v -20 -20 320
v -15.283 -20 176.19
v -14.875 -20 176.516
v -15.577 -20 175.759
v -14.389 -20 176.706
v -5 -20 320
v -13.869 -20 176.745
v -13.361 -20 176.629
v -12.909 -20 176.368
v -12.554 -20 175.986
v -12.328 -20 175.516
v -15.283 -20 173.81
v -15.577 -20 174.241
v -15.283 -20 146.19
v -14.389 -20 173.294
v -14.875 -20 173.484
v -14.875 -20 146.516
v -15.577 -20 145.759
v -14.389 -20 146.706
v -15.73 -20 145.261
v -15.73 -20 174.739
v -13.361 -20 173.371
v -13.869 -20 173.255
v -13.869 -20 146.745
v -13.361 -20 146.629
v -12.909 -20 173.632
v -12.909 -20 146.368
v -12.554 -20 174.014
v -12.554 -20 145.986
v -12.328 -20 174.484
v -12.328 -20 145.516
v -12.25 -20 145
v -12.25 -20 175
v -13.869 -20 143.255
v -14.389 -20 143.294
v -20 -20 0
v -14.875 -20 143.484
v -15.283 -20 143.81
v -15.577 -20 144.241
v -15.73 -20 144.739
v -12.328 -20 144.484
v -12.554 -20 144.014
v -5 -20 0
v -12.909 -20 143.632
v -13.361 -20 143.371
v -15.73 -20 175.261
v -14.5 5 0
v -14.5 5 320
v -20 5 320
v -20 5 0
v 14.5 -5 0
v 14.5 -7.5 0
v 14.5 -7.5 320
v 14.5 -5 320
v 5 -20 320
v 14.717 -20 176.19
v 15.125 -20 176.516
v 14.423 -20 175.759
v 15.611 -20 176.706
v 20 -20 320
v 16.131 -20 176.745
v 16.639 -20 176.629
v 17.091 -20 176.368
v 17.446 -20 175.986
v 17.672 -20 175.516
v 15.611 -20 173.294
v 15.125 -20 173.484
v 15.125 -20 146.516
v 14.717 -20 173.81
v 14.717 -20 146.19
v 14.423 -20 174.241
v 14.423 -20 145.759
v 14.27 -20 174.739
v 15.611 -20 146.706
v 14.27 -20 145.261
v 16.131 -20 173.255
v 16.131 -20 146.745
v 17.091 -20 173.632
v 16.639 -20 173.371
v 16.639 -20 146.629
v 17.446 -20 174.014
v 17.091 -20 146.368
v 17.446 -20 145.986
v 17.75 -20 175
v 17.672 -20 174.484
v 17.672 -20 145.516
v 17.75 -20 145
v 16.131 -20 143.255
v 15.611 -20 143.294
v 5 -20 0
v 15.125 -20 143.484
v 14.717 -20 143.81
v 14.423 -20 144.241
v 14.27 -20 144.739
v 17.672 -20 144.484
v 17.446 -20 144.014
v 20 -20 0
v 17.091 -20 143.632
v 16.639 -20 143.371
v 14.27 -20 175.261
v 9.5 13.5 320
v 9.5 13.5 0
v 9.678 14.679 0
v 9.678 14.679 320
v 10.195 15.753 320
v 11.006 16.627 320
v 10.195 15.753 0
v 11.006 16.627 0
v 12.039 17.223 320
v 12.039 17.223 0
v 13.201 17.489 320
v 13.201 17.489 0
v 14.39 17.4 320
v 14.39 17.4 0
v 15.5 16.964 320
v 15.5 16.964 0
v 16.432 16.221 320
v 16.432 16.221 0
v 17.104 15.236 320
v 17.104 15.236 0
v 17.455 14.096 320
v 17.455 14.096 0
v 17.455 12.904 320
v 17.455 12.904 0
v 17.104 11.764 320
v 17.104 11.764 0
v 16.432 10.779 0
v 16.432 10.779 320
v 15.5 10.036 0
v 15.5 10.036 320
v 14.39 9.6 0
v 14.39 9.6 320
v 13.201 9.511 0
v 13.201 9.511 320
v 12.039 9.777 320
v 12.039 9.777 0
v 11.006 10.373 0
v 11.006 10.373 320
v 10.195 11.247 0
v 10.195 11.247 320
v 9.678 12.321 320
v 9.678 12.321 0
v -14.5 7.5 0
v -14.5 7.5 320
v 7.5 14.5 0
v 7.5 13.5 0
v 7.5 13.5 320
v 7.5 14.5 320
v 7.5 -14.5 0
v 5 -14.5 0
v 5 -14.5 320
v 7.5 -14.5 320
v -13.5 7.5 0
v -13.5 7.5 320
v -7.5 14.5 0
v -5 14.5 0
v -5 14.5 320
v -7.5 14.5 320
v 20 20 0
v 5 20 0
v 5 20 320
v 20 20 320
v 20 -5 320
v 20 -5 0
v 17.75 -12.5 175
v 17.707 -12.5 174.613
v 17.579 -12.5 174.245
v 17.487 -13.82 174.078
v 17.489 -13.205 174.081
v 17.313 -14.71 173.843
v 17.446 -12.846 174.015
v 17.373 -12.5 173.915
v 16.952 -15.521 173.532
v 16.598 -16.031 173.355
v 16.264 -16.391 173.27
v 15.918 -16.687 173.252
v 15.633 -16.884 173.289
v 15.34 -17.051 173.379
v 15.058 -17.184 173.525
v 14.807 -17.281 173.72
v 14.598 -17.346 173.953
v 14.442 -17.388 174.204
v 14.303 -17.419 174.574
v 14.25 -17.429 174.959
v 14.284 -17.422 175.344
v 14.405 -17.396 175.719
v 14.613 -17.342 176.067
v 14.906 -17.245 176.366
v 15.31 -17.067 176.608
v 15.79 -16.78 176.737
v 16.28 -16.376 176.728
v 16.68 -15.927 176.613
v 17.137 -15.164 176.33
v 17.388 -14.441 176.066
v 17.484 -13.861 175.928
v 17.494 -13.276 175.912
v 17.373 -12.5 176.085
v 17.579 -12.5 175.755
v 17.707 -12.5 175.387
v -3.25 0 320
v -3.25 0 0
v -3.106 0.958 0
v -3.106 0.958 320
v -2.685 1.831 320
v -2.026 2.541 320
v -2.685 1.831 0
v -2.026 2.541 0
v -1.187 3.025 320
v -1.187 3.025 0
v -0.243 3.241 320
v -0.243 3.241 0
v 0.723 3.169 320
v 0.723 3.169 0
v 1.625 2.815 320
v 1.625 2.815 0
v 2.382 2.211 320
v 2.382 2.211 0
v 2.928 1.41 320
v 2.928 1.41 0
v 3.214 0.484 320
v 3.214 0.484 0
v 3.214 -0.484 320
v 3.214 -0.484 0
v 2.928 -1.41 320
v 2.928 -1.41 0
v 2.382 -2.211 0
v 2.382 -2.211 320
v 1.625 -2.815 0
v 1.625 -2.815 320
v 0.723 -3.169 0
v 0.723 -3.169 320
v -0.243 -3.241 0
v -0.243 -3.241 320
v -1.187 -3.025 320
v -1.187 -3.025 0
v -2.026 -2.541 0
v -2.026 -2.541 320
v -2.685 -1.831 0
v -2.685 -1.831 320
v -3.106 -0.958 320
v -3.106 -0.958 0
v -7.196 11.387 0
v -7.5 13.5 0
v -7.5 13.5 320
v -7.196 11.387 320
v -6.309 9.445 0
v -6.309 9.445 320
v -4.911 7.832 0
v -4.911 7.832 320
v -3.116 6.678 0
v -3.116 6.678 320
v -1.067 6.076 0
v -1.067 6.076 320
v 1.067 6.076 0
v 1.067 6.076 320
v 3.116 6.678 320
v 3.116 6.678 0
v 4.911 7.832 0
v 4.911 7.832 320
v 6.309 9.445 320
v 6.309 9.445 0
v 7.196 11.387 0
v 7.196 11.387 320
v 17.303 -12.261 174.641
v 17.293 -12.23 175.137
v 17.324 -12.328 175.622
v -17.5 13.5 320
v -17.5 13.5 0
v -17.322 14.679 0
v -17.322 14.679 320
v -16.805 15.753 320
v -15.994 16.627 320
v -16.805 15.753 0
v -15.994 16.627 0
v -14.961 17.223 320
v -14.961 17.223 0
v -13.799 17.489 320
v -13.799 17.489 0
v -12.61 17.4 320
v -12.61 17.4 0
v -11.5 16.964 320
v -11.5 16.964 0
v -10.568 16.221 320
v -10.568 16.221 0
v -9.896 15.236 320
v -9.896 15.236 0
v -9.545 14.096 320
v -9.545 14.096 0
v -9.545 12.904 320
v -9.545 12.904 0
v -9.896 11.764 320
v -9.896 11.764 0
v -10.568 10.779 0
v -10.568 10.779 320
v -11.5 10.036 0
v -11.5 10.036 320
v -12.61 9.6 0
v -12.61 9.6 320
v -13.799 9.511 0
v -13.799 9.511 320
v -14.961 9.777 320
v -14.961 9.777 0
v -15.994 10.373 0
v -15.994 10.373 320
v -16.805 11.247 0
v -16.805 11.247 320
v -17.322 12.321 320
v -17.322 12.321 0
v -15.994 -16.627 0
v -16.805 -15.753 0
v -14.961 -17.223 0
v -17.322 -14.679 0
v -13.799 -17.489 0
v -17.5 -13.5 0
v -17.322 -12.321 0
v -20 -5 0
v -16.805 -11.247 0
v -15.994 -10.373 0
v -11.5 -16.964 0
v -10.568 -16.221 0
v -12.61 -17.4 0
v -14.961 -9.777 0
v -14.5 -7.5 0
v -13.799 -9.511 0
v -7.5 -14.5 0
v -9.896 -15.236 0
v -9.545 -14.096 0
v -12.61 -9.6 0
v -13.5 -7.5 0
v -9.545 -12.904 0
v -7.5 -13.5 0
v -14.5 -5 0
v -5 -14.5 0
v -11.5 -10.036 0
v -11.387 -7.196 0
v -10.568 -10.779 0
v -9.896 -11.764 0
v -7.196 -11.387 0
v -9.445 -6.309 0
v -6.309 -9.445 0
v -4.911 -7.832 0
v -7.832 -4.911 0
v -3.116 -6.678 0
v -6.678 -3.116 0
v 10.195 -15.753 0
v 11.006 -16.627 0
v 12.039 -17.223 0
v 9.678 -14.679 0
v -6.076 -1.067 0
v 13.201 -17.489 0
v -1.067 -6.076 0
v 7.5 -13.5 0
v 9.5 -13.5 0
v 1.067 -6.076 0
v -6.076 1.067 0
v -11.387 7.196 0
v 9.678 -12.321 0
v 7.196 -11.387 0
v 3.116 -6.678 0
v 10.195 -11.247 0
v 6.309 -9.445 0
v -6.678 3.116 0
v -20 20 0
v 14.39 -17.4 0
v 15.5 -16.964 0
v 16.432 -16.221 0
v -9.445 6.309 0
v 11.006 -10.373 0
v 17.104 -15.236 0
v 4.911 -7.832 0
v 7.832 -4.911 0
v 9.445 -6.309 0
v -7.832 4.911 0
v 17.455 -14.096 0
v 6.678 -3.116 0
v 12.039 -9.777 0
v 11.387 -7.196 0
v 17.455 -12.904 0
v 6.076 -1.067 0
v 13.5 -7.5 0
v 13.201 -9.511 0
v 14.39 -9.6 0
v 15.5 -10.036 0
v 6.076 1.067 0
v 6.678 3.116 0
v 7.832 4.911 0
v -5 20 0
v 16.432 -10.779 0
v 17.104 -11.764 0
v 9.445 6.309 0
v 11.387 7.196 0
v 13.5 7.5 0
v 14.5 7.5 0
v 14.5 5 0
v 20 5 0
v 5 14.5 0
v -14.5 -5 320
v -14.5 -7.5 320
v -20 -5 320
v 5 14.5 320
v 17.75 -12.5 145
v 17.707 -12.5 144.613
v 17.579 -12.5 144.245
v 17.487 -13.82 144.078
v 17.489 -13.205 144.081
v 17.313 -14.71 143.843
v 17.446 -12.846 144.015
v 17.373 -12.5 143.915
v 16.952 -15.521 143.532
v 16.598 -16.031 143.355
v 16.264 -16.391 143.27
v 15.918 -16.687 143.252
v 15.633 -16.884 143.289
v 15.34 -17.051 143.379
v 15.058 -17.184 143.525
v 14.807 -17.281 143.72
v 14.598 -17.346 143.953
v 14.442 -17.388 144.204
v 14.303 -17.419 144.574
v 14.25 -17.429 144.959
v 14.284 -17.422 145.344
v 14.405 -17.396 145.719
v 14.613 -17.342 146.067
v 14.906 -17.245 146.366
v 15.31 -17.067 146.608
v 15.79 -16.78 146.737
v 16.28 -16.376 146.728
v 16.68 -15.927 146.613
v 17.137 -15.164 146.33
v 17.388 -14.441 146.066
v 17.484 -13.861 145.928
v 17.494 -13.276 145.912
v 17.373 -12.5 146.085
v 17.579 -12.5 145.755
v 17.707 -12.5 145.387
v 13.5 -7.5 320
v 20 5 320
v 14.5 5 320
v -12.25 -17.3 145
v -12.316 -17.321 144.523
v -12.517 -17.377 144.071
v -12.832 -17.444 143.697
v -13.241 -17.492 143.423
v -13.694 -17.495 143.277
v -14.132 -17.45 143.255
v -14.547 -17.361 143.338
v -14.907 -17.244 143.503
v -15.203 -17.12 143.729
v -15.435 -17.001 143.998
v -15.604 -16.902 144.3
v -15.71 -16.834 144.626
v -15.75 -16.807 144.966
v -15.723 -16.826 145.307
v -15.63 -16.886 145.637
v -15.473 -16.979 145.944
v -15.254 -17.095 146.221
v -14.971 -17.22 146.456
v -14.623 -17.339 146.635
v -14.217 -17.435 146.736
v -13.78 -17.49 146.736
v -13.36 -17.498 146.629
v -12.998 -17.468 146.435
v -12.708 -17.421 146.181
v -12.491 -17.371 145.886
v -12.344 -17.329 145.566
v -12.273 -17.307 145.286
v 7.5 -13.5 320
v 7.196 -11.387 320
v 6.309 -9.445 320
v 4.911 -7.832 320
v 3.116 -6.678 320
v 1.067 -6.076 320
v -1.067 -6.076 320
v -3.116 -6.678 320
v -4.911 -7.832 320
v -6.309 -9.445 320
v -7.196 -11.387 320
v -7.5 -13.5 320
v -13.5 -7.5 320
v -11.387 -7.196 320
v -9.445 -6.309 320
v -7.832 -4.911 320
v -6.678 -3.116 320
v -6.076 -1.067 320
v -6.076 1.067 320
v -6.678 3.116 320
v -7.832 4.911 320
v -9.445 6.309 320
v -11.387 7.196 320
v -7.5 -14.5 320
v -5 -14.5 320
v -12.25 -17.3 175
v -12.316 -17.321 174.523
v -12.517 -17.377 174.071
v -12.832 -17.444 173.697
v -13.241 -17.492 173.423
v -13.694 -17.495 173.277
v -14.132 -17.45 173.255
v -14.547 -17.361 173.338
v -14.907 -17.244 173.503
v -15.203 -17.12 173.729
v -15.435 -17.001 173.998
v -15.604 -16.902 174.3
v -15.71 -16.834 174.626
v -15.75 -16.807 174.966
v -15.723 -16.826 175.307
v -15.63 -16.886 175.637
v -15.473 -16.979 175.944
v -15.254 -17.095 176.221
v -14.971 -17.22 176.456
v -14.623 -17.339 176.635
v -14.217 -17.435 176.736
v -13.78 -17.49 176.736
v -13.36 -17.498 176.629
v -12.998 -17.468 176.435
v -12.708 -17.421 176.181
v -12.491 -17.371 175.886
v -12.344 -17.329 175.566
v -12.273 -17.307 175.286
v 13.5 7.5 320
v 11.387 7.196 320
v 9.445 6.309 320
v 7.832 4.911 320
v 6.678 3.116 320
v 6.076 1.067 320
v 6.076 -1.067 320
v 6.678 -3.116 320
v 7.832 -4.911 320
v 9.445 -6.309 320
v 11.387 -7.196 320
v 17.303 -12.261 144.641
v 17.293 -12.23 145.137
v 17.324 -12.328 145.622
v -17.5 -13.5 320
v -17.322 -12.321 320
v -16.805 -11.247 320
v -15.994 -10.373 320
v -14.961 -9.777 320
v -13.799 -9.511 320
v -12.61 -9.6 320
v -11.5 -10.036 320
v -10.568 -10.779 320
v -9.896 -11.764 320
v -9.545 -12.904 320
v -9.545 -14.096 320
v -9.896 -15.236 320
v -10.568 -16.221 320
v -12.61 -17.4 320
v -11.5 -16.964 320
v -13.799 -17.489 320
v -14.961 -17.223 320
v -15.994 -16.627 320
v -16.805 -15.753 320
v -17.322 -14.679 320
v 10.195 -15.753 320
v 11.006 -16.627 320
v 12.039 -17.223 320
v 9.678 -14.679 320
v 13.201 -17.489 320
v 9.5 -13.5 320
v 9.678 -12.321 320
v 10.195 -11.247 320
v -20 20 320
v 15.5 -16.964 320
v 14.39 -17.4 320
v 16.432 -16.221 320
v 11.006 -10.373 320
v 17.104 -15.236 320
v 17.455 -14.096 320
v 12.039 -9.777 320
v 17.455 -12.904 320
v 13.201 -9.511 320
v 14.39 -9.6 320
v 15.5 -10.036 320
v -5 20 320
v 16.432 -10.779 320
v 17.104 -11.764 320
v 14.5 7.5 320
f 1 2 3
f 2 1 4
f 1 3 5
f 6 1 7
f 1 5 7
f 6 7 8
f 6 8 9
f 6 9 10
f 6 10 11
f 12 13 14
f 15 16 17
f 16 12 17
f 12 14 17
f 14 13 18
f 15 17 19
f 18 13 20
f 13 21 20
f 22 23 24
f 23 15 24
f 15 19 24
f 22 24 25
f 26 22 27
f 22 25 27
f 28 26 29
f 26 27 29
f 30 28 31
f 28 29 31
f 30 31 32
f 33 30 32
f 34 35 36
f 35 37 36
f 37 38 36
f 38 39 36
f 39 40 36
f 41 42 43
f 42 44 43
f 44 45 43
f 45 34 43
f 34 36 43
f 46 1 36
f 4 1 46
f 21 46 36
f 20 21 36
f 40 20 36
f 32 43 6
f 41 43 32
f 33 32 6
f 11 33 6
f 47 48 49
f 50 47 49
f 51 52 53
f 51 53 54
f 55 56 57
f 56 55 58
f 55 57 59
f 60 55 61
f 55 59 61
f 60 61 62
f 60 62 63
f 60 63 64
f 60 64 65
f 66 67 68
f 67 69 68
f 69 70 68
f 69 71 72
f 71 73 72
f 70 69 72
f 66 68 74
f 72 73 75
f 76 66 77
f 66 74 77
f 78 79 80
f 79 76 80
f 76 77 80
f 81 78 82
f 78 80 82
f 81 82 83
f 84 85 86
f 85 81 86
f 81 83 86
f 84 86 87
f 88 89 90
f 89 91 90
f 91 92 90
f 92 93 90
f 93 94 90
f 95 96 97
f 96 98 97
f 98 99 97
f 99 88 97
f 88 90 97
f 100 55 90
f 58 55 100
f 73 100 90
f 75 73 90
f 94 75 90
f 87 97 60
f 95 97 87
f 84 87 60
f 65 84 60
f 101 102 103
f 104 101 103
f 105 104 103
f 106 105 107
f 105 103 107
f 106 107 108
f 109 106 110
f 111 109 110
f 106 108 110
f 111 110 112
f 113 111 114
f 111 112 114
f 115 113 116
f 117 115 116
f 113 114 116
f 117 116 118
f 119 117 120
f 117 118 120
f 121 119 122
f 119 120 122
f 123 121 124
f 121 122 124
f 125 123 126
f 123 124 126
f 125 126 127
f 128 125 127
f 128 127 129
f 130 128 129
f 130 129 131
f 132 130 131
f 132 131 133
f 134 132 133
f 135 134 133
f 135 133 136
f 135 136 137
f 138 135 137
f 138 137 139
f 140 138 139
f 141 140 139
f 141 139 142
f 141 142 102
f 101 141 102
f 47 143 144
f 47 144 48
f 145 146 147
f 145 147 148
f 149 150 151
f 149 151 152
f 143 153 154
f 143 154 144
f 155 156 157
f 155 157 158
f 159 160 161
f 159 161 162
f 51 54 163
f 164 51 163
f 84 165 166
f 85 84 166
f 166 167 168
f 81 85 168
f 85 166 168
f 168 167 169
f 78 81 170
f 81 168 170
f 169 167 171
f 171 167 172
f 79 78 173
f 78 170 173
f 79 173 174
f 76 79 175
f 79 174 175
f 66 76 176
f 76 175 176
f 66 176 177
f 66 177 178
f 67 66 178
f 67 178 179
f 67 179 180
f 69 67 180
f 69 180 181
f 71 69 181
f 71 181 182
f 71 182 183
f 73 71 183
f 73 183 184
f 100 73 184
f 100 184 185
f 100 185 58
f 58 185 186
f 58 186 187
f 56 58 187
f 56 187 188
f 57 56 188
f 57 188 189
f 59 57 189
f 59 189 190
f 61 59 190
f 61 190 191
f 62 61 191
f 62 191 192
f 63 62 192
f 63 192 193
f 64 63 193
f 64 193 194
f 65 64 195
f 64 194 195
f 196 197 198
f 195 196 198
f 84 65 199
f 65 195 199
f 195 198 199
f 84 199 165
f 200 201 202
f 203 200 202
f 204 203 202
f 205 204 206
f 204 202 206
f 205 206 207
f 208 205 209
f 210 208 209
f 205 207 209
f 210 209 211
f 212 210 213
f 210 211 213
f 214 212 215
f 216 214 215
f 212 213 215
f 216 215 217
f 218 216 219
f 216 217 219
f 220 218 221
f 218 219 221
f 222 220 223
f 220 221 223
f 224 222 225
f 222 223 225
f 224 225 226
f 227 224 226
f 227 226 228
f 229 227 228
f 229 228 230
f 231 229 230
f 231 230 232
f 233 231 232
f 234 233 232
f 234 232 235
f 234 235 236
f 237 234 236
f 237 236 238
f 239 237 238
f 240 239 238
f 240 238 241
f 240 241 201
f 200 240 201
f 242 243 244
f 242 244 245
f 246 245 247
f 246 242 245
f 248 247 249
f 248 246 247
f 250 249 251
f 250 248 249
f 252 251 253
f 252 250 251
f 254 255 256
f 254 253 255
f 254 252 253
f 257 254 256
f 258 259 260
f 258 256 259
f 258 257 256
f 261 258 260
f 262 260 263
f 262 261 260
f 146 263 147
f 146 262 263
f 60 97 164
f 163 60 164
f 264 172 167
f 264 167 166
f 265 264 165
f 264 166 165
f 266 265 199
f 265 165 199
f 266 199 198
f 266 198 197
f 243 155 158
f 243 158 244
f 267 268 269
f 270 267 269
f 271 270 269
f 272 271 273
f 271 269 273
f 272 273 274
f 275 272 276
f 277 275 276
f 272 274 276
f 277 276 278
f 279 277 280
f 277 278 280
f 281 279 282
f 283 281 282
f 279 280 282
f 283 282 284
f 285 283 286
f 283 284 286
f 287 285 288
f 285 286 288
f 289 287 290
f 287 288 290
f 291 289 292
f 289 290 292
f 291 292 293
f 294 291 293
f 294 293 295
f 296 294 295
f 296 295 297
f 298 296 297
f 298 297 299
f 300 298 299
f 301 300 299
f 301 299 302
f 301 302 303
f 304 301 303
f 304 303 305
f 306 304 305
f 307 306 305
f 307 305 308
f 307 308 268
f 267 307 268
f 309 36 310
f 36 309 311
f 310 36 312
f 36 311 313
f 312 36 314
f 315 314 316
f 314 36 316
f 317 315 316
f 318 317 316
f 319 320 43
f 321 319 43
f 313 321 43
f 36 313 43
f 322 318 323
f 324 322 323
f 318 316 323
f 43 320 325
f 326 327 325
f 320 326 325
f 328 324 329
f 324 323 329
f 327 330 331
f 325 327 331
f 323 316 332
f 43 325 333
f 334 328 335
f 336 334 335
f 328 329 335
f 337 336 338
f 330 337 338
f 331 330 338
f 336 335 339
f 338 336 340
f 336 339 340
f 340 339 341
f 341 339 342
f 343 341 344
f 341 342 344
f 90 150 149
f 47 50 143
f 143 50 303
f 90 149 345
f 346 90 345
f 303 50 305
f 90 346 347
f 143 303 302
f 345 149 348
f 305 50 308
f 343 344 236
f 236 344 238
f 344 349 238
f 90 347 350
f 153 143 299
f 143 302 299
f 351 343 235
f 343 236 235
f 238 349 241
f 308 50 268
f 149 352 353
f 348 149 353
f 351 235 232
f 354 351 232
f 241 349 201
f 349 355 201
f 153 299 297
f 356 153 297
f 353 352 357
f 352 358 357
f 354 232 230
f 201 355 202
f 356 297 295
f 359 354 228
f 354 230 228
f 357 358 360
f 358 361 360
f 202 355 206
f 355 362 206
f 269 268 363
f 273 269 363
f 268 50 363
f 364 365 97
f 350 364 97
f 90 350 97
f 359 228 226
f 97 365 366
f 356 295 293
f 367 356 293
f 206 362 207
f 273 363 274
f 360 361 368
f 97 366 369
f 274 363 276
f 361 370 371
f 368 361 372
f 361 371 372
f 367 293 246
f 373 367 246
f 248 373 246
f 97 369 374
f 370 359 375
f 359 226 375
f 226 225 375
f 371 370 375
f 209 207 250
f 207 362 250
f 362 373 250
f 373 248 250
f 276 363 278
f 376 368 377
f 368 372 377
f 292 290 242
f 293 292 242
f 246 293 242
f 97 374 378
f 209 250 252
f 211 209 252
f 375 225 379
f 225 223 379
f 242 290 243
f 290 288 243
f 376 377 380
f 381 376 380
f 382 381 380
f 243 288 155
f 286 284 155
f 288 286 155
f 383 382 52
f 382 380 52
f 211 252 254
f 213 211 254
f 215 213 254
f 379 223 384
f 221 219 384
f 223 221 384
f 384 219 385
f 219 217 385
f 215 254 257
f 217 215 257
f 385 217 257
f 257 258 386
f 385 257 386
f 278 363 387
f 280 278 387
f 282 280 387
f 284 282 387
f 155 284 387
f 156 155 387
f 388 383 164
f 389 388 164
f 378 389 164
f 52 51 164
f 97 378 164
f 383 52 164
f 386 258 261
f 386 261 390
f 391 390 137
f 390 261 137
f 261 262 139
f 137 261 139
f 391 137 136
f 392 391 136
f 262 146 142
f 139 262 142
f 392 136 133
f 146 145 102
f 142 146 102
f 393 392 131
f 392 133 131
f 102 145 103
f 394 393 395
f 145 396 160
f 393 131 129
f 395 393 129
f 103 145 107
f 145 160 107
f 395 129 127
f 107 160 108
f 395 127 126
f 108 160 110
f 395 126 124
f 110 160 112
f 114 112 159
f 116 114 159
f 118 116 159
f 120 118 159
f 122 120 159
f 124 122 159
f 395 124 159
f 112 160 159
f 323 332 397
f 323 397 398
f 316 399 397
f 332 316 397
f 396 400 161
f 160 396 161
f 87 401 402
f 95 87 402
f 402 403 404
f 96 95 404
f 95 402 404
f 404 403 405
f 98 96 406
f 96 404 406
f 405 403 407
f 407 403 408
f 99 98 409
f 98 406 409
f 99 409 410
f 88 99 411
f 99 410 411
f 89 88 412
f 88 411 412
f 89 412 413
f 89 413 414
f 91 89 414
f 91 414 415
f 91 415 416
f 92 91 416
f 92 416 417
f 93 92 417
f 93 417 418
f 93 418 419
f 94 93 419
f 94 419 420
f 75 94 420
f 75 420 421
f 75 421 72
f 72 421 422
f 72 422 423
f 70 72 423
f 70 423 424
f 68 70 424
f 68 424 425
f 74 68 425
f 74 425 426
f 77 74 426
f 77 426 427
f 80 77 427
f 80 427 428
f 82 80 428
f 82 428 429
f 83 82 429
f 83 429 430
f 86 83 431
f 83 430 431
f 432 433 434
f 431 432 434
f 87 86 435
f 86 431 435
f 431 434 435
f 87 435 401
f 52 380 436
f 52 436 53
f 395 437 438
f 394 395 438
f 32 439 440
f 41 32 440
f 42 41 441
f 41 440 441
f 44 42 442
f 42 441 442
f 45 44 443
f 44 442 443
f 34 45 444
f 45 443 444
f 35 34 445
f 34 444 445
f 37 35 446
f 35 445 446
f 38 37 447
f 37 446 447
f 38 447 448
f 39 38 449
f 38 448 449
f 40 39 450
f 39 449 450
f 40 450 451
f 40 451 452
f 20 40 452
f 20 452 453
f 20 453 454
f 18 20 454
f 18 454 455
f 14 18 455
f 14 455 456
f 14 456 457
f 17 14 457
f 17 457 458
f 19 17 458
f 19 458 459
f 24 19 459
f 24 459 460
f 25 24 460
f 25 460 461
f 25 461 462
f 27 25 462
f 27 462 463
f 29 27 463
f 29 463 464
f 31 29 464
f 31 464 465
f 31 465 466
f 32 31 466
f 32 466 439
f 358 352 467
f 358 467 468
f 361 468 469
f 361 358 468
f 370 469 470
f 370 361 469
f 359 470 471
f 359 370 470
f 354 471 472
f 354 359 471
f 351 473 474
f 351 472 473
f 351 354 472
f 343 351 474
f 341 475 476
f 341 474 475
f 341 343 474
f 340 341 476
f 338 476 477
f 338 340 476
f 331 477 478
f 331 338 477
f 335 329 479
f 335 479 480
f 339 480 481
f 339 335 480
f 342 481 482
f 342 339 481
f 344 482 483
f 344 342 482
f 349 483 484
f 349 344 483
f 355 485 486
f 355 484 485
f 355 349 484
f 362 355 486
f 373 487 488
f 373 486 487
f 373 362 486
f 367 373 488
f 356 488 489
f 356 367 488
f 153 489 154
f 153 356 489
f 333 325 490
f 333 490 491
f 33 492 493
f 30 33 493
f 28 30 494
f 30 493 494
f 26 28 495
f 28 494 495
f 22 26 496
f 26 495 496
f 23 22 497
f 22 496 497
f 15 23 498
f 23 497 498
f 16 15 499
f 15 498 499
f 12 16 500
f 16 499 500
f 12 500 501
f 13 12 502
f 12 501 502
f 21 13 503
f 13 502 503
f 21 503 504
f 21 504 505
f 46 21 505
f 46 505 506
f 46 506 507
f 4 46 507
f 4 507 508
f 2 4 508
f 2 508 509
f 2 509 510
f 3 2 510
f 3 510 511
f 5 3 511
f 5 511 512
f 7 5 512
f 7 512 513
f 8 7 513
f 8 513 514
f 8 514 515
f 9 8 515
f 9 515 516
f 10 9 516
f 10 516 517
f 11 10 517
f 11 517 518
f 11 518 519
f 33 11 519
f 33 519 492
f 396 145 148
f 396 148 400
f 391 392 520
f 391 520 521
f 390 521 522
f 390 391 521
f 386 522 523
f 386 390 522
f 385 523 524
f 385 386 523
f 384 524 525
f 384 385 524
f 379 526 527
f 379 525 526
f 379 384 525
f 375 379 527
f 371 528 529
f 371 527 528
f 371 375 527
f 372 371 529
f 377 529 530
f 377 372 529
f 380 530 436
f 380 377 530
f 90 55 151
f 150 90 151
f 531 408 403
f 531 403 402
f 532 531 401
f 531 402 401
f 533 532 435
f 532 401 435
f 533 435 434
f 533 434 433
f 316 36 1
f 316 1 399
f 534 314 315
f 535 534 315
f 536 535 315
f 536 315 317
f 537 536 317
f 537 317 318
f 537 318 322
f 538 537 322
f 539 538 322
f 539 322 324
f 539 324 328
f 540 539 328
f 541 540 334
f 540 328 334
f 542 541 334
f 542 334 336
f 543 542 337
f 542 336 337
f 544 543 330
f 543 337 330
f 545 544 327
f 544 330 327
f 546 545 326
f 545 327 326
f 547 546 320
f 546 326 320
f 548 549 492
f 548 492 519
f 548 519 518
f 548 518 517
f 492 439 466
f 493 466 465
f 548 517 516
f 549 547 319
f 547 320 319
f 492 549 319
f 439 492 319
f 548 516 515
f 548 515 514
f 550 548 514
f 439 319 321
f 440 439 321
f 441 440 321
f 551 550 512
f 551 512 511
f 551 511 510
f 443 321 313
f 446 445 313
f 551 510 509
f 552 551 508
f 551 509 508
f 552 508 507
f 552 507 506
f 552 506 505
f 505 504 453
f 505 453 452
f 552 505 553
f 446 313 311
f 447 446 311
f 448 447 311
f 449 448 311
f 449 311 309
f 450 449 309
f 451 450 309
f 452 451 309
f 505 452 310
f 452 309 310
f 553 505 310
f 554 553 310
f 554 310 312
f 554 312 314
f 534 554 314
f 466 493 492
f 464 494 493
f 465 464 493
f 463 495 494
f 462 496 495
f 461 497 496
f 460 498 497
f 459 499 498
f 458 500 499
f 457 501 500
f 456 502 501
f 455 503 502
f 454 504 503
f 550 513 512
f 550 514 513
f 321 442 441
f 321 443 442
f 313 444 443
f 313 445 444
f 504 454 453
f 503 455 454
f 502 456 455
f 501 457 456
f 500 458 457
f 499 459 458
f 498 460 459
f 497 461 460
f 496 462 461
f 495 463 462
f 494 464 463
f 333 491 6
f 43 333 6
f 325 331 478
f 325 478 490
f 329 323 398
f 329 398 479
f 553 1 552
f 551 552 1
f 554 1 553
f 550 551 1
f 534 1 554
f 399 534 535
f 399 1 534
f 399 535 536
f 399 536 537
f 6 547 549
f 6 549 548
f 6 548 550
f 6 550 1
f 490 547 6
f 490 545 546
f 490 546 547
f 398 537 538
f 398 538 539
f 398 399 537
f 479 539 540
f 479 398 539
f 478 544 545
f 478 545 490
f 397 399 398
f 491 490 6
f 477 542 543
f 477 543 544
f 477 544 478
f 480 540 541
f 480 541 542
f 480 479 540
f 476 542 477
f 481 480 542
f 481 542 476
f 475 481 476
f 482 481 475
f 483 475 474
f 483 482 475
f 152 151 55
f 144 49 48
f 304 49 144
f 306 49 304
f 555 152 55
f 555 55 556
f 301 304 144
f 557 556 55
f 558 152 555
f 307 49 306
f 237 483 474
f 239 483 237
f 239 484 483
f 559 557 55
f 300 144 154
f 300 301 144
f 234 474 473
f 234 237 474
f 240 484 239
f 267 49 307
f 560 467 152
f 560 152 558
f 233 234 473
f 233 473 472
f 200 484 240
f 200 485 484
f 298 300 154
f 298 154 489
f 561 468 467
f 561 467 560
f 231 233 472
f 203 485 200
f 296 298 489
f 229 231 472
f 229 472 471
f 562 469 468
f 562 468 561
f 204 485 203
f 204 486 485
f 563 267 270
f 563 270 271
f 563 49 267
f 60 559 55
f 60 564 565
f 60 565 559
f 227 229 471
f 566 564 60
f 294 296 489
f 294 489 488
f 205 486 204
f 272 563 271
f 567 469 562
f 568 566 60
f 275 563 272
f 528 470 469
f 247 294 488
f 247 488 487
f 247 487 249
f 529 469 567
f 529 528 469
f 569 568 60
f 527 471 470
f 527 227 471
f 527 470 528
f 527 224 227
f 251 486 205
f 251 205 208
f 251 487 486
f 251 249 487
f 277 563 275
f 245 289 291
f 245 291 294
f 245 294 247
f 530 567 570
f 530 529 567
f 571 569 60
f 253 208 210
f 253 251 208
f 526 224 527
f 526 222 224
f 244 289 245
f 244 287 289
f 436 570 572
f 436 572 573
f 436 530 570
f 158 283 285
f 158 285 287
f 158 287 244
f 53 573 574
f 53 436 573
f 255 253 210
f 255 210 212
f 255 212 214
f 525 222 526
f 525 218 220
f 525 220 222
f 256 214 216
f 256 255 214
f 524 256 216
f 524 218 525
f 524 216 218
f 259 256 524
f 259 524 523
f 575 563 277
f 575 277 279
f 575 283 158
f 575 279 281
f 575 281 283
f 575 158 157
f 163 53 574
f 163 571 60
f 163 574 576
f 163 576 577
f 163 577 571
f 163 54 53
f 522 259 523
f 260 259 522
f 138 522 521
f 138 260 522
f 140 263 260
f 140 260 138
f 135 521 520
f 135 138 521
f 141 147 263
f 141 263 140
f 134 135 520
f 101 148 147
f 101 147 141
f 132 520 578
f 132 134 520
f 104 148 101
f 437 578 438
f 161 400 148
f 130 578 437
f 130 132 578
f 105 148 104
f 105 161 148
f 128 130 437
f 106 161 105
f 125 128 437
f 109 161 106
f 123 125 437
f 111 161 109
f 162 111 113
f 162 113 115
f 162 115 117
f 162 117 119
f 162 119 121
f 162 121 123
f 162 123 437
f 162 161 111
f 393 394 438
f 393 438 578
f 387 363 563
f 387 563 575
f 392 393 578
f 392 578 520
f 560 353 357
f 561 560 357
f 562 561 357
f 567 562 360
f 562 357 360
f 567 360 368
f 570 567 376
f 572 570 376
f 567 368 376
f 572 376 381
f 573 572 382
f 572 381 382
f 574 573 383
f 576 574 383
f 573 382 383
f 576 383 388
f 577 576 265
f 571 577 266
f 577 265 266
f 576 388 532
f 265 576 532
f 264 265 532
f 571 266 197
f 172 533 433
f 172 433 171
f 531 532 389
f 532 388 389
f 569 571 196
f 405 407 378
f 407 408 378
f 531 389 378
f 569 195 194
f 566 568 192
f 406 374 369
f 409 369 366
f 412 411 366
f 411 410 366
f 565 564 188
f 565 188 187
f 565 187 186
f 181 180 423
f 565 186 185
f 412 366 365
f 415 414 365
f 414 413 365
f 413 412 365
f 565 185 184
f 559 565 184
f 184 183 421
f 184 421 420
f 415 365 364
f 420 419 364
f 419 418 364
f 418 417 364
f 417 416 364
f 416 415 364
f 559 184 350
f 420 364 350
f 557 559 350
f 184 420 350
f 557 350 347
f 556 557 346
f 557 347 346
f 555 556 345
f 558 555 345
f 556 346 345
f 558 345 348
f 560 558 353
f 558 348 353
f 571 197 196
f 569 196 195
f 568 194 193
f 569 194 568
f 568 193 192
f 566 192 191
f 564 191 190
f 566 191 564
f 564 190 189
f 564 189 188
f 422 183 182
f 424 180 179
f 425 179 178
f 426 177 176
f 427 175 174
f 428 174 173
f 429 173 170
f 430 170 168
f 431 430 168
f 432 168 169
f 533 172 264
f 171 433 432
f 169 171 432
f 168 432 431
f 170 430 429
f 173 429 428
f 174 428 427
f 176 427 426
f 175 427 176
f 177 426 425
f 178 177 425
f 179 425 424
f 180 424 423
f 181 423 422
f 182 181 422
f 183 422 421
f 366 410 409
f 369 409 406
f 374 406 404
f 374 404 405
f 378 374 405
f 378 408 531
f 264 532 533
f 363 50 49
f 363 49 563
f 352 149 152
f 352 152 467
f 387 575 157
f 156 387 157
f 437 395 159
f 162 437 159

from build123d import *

# Parameters (mm, degrees)
SKETCH_1_W                  = 40
SKETCH_1_H                  = 40
EXTRUDE_1_DEPTH             = 320
SKETCH_2_R                  = 3.25
SKETCH_2_R_2                = 4
CUT_EXTRUDE_1_DEPTH         = 321
HOLE_WIZARD_3_5_3_5_1_D     = 3.5
HOLE_WIZARD_3_5_3_5_1_DEPTH = 7.5
HOLE_WIZARD_3_5_3_5_1_TIP   = 1.051506083


with BuildPart() as part:
    # 草圖1 → 伸長1 (new body)
    with BuildSketch(Plane.XY):
        Rectangle(SKETCH_1_W, SKETCH_1_H)
    extrude(amount=EXTRUDE_1_DEPTH)

    # 草圖2 → 除料-伸長1 (cut, through all)
    with BuildSketch(Plane(origin=(0, 0, 0), x_dir=(-1, 0, 0), z_dir=(0, 0, -1))):
        Circle(SKETCH_2_R)
        with Locations((-13.5, 13.5)):
            Circle(SKETCH_2_R_2)
        with Locations((13.5, 13.5)):
            Circle(SKETCH_2_R_2)
        with Locations((-13.5, -13.5)):
            Circle(SKETCH_2_R_2)
        with Locations((13.5, -13.5)):
            Circle(SKETCH_2_R_2)
        with BuildLine():
            Line((5, 14.5), (7.5, 14.5))
            Line((7.5, 14.5), (7.5, 13.5))
            ThreePointArc((7.5, 13.5), (0, 6), (-7.5, 13.5))
            Line((-7.5, 13.5), (-7.5, 14.5))
            Line((-7.5, 14.5), (-5, 14.5))
            Line((-5, 14.5), (-5, 20))
            Line((-5, 20), (5, 20))
            Line((5, 20), (5, 14.5))
        make_face()
        with BuildLine():
            Line((14.5, -5), (14.5, -7.5))
            Line((14.5, -7.5), (13.5, -7.5))
            ThreePointArc((13.5, -7.5), (6, 0), (13.5, 7.5))
            Line((13.5, 7.5), (14.5, 7.5))
            Line((14.5, 7.5), (14.5, 5))
            Line((14.5, 5), (20, 5))
            Line((20, 5), (20, -5))
            Line((20, -5), (14.5, -5))
        make_face()
        with BuildLine():
            Line((-5, -14.5), (-7.5, -14.5))
            Line((-7.5, -14.5), (-7.5, -13.5))
            ThreePointArc((-7.5, -13.5), (0, -6), (7.5, -13.5))
            Line((7.5, -13.5), (7.5, -14.5))
            Line((7.5, -14.5), (5, -14.5))
            Line((5, -14.5), (5, -20))
            Line((5, -20), (-5, -20))
            Line((-5, -20), (-5, -14.5))
        make_face()
        with BuildLine():
            Line((-14.5, 5), (-14.5, 7.5))
            Line((-14.5, 7.5), (-13.5, 7.5))
            ThreePointArc((-13.5, 7.5), (-6, 0), (-13.5, -7.5))
            Line((-13.5, -7.5), (-14.5, -7.5))
            Line((-14.5, -7.5), (-14.5, -5))
            Line((-14.5, -5), (-20, -5))
            Line((-20, -5), (-20, 5))
            Line((-20, 5), (-14.5, 5))
        make_face()
    extrude(amount=-CUT_EXTRUDE_1_DEPTH, mode=Mode.SUBTRACT)

    # Ø3.5 (3.5) 直徑孔1
    with Locations(Plane(origin=(0, -20, 0), x_dir=(-1, 0, 0), z_dir=(0, -1, 0))):
        with Locations((-16, -145), (-16, -175), (14, -145), (14, -175)):
            Hole(HOLE_WIZARD_3_5_3_5_1_D / 2, depth=HOLE_WIZARD_3_5_3_5_1_DEPTH)
            with Locations((0, 0, -(HOLE_WIZARD_3_5_3_5_1_DEPTH + HOLE_WIZARD_3_5_3_5_1_TIP / 2))):  # 118° drill point
                Cone(0, HOLE_WIZARD_3_5_3_5_1_D / 2, HOLE_WIZARD_3_5_3_5_1_TIP, mode=Mode.SUBTRACT)


solid = part.part
